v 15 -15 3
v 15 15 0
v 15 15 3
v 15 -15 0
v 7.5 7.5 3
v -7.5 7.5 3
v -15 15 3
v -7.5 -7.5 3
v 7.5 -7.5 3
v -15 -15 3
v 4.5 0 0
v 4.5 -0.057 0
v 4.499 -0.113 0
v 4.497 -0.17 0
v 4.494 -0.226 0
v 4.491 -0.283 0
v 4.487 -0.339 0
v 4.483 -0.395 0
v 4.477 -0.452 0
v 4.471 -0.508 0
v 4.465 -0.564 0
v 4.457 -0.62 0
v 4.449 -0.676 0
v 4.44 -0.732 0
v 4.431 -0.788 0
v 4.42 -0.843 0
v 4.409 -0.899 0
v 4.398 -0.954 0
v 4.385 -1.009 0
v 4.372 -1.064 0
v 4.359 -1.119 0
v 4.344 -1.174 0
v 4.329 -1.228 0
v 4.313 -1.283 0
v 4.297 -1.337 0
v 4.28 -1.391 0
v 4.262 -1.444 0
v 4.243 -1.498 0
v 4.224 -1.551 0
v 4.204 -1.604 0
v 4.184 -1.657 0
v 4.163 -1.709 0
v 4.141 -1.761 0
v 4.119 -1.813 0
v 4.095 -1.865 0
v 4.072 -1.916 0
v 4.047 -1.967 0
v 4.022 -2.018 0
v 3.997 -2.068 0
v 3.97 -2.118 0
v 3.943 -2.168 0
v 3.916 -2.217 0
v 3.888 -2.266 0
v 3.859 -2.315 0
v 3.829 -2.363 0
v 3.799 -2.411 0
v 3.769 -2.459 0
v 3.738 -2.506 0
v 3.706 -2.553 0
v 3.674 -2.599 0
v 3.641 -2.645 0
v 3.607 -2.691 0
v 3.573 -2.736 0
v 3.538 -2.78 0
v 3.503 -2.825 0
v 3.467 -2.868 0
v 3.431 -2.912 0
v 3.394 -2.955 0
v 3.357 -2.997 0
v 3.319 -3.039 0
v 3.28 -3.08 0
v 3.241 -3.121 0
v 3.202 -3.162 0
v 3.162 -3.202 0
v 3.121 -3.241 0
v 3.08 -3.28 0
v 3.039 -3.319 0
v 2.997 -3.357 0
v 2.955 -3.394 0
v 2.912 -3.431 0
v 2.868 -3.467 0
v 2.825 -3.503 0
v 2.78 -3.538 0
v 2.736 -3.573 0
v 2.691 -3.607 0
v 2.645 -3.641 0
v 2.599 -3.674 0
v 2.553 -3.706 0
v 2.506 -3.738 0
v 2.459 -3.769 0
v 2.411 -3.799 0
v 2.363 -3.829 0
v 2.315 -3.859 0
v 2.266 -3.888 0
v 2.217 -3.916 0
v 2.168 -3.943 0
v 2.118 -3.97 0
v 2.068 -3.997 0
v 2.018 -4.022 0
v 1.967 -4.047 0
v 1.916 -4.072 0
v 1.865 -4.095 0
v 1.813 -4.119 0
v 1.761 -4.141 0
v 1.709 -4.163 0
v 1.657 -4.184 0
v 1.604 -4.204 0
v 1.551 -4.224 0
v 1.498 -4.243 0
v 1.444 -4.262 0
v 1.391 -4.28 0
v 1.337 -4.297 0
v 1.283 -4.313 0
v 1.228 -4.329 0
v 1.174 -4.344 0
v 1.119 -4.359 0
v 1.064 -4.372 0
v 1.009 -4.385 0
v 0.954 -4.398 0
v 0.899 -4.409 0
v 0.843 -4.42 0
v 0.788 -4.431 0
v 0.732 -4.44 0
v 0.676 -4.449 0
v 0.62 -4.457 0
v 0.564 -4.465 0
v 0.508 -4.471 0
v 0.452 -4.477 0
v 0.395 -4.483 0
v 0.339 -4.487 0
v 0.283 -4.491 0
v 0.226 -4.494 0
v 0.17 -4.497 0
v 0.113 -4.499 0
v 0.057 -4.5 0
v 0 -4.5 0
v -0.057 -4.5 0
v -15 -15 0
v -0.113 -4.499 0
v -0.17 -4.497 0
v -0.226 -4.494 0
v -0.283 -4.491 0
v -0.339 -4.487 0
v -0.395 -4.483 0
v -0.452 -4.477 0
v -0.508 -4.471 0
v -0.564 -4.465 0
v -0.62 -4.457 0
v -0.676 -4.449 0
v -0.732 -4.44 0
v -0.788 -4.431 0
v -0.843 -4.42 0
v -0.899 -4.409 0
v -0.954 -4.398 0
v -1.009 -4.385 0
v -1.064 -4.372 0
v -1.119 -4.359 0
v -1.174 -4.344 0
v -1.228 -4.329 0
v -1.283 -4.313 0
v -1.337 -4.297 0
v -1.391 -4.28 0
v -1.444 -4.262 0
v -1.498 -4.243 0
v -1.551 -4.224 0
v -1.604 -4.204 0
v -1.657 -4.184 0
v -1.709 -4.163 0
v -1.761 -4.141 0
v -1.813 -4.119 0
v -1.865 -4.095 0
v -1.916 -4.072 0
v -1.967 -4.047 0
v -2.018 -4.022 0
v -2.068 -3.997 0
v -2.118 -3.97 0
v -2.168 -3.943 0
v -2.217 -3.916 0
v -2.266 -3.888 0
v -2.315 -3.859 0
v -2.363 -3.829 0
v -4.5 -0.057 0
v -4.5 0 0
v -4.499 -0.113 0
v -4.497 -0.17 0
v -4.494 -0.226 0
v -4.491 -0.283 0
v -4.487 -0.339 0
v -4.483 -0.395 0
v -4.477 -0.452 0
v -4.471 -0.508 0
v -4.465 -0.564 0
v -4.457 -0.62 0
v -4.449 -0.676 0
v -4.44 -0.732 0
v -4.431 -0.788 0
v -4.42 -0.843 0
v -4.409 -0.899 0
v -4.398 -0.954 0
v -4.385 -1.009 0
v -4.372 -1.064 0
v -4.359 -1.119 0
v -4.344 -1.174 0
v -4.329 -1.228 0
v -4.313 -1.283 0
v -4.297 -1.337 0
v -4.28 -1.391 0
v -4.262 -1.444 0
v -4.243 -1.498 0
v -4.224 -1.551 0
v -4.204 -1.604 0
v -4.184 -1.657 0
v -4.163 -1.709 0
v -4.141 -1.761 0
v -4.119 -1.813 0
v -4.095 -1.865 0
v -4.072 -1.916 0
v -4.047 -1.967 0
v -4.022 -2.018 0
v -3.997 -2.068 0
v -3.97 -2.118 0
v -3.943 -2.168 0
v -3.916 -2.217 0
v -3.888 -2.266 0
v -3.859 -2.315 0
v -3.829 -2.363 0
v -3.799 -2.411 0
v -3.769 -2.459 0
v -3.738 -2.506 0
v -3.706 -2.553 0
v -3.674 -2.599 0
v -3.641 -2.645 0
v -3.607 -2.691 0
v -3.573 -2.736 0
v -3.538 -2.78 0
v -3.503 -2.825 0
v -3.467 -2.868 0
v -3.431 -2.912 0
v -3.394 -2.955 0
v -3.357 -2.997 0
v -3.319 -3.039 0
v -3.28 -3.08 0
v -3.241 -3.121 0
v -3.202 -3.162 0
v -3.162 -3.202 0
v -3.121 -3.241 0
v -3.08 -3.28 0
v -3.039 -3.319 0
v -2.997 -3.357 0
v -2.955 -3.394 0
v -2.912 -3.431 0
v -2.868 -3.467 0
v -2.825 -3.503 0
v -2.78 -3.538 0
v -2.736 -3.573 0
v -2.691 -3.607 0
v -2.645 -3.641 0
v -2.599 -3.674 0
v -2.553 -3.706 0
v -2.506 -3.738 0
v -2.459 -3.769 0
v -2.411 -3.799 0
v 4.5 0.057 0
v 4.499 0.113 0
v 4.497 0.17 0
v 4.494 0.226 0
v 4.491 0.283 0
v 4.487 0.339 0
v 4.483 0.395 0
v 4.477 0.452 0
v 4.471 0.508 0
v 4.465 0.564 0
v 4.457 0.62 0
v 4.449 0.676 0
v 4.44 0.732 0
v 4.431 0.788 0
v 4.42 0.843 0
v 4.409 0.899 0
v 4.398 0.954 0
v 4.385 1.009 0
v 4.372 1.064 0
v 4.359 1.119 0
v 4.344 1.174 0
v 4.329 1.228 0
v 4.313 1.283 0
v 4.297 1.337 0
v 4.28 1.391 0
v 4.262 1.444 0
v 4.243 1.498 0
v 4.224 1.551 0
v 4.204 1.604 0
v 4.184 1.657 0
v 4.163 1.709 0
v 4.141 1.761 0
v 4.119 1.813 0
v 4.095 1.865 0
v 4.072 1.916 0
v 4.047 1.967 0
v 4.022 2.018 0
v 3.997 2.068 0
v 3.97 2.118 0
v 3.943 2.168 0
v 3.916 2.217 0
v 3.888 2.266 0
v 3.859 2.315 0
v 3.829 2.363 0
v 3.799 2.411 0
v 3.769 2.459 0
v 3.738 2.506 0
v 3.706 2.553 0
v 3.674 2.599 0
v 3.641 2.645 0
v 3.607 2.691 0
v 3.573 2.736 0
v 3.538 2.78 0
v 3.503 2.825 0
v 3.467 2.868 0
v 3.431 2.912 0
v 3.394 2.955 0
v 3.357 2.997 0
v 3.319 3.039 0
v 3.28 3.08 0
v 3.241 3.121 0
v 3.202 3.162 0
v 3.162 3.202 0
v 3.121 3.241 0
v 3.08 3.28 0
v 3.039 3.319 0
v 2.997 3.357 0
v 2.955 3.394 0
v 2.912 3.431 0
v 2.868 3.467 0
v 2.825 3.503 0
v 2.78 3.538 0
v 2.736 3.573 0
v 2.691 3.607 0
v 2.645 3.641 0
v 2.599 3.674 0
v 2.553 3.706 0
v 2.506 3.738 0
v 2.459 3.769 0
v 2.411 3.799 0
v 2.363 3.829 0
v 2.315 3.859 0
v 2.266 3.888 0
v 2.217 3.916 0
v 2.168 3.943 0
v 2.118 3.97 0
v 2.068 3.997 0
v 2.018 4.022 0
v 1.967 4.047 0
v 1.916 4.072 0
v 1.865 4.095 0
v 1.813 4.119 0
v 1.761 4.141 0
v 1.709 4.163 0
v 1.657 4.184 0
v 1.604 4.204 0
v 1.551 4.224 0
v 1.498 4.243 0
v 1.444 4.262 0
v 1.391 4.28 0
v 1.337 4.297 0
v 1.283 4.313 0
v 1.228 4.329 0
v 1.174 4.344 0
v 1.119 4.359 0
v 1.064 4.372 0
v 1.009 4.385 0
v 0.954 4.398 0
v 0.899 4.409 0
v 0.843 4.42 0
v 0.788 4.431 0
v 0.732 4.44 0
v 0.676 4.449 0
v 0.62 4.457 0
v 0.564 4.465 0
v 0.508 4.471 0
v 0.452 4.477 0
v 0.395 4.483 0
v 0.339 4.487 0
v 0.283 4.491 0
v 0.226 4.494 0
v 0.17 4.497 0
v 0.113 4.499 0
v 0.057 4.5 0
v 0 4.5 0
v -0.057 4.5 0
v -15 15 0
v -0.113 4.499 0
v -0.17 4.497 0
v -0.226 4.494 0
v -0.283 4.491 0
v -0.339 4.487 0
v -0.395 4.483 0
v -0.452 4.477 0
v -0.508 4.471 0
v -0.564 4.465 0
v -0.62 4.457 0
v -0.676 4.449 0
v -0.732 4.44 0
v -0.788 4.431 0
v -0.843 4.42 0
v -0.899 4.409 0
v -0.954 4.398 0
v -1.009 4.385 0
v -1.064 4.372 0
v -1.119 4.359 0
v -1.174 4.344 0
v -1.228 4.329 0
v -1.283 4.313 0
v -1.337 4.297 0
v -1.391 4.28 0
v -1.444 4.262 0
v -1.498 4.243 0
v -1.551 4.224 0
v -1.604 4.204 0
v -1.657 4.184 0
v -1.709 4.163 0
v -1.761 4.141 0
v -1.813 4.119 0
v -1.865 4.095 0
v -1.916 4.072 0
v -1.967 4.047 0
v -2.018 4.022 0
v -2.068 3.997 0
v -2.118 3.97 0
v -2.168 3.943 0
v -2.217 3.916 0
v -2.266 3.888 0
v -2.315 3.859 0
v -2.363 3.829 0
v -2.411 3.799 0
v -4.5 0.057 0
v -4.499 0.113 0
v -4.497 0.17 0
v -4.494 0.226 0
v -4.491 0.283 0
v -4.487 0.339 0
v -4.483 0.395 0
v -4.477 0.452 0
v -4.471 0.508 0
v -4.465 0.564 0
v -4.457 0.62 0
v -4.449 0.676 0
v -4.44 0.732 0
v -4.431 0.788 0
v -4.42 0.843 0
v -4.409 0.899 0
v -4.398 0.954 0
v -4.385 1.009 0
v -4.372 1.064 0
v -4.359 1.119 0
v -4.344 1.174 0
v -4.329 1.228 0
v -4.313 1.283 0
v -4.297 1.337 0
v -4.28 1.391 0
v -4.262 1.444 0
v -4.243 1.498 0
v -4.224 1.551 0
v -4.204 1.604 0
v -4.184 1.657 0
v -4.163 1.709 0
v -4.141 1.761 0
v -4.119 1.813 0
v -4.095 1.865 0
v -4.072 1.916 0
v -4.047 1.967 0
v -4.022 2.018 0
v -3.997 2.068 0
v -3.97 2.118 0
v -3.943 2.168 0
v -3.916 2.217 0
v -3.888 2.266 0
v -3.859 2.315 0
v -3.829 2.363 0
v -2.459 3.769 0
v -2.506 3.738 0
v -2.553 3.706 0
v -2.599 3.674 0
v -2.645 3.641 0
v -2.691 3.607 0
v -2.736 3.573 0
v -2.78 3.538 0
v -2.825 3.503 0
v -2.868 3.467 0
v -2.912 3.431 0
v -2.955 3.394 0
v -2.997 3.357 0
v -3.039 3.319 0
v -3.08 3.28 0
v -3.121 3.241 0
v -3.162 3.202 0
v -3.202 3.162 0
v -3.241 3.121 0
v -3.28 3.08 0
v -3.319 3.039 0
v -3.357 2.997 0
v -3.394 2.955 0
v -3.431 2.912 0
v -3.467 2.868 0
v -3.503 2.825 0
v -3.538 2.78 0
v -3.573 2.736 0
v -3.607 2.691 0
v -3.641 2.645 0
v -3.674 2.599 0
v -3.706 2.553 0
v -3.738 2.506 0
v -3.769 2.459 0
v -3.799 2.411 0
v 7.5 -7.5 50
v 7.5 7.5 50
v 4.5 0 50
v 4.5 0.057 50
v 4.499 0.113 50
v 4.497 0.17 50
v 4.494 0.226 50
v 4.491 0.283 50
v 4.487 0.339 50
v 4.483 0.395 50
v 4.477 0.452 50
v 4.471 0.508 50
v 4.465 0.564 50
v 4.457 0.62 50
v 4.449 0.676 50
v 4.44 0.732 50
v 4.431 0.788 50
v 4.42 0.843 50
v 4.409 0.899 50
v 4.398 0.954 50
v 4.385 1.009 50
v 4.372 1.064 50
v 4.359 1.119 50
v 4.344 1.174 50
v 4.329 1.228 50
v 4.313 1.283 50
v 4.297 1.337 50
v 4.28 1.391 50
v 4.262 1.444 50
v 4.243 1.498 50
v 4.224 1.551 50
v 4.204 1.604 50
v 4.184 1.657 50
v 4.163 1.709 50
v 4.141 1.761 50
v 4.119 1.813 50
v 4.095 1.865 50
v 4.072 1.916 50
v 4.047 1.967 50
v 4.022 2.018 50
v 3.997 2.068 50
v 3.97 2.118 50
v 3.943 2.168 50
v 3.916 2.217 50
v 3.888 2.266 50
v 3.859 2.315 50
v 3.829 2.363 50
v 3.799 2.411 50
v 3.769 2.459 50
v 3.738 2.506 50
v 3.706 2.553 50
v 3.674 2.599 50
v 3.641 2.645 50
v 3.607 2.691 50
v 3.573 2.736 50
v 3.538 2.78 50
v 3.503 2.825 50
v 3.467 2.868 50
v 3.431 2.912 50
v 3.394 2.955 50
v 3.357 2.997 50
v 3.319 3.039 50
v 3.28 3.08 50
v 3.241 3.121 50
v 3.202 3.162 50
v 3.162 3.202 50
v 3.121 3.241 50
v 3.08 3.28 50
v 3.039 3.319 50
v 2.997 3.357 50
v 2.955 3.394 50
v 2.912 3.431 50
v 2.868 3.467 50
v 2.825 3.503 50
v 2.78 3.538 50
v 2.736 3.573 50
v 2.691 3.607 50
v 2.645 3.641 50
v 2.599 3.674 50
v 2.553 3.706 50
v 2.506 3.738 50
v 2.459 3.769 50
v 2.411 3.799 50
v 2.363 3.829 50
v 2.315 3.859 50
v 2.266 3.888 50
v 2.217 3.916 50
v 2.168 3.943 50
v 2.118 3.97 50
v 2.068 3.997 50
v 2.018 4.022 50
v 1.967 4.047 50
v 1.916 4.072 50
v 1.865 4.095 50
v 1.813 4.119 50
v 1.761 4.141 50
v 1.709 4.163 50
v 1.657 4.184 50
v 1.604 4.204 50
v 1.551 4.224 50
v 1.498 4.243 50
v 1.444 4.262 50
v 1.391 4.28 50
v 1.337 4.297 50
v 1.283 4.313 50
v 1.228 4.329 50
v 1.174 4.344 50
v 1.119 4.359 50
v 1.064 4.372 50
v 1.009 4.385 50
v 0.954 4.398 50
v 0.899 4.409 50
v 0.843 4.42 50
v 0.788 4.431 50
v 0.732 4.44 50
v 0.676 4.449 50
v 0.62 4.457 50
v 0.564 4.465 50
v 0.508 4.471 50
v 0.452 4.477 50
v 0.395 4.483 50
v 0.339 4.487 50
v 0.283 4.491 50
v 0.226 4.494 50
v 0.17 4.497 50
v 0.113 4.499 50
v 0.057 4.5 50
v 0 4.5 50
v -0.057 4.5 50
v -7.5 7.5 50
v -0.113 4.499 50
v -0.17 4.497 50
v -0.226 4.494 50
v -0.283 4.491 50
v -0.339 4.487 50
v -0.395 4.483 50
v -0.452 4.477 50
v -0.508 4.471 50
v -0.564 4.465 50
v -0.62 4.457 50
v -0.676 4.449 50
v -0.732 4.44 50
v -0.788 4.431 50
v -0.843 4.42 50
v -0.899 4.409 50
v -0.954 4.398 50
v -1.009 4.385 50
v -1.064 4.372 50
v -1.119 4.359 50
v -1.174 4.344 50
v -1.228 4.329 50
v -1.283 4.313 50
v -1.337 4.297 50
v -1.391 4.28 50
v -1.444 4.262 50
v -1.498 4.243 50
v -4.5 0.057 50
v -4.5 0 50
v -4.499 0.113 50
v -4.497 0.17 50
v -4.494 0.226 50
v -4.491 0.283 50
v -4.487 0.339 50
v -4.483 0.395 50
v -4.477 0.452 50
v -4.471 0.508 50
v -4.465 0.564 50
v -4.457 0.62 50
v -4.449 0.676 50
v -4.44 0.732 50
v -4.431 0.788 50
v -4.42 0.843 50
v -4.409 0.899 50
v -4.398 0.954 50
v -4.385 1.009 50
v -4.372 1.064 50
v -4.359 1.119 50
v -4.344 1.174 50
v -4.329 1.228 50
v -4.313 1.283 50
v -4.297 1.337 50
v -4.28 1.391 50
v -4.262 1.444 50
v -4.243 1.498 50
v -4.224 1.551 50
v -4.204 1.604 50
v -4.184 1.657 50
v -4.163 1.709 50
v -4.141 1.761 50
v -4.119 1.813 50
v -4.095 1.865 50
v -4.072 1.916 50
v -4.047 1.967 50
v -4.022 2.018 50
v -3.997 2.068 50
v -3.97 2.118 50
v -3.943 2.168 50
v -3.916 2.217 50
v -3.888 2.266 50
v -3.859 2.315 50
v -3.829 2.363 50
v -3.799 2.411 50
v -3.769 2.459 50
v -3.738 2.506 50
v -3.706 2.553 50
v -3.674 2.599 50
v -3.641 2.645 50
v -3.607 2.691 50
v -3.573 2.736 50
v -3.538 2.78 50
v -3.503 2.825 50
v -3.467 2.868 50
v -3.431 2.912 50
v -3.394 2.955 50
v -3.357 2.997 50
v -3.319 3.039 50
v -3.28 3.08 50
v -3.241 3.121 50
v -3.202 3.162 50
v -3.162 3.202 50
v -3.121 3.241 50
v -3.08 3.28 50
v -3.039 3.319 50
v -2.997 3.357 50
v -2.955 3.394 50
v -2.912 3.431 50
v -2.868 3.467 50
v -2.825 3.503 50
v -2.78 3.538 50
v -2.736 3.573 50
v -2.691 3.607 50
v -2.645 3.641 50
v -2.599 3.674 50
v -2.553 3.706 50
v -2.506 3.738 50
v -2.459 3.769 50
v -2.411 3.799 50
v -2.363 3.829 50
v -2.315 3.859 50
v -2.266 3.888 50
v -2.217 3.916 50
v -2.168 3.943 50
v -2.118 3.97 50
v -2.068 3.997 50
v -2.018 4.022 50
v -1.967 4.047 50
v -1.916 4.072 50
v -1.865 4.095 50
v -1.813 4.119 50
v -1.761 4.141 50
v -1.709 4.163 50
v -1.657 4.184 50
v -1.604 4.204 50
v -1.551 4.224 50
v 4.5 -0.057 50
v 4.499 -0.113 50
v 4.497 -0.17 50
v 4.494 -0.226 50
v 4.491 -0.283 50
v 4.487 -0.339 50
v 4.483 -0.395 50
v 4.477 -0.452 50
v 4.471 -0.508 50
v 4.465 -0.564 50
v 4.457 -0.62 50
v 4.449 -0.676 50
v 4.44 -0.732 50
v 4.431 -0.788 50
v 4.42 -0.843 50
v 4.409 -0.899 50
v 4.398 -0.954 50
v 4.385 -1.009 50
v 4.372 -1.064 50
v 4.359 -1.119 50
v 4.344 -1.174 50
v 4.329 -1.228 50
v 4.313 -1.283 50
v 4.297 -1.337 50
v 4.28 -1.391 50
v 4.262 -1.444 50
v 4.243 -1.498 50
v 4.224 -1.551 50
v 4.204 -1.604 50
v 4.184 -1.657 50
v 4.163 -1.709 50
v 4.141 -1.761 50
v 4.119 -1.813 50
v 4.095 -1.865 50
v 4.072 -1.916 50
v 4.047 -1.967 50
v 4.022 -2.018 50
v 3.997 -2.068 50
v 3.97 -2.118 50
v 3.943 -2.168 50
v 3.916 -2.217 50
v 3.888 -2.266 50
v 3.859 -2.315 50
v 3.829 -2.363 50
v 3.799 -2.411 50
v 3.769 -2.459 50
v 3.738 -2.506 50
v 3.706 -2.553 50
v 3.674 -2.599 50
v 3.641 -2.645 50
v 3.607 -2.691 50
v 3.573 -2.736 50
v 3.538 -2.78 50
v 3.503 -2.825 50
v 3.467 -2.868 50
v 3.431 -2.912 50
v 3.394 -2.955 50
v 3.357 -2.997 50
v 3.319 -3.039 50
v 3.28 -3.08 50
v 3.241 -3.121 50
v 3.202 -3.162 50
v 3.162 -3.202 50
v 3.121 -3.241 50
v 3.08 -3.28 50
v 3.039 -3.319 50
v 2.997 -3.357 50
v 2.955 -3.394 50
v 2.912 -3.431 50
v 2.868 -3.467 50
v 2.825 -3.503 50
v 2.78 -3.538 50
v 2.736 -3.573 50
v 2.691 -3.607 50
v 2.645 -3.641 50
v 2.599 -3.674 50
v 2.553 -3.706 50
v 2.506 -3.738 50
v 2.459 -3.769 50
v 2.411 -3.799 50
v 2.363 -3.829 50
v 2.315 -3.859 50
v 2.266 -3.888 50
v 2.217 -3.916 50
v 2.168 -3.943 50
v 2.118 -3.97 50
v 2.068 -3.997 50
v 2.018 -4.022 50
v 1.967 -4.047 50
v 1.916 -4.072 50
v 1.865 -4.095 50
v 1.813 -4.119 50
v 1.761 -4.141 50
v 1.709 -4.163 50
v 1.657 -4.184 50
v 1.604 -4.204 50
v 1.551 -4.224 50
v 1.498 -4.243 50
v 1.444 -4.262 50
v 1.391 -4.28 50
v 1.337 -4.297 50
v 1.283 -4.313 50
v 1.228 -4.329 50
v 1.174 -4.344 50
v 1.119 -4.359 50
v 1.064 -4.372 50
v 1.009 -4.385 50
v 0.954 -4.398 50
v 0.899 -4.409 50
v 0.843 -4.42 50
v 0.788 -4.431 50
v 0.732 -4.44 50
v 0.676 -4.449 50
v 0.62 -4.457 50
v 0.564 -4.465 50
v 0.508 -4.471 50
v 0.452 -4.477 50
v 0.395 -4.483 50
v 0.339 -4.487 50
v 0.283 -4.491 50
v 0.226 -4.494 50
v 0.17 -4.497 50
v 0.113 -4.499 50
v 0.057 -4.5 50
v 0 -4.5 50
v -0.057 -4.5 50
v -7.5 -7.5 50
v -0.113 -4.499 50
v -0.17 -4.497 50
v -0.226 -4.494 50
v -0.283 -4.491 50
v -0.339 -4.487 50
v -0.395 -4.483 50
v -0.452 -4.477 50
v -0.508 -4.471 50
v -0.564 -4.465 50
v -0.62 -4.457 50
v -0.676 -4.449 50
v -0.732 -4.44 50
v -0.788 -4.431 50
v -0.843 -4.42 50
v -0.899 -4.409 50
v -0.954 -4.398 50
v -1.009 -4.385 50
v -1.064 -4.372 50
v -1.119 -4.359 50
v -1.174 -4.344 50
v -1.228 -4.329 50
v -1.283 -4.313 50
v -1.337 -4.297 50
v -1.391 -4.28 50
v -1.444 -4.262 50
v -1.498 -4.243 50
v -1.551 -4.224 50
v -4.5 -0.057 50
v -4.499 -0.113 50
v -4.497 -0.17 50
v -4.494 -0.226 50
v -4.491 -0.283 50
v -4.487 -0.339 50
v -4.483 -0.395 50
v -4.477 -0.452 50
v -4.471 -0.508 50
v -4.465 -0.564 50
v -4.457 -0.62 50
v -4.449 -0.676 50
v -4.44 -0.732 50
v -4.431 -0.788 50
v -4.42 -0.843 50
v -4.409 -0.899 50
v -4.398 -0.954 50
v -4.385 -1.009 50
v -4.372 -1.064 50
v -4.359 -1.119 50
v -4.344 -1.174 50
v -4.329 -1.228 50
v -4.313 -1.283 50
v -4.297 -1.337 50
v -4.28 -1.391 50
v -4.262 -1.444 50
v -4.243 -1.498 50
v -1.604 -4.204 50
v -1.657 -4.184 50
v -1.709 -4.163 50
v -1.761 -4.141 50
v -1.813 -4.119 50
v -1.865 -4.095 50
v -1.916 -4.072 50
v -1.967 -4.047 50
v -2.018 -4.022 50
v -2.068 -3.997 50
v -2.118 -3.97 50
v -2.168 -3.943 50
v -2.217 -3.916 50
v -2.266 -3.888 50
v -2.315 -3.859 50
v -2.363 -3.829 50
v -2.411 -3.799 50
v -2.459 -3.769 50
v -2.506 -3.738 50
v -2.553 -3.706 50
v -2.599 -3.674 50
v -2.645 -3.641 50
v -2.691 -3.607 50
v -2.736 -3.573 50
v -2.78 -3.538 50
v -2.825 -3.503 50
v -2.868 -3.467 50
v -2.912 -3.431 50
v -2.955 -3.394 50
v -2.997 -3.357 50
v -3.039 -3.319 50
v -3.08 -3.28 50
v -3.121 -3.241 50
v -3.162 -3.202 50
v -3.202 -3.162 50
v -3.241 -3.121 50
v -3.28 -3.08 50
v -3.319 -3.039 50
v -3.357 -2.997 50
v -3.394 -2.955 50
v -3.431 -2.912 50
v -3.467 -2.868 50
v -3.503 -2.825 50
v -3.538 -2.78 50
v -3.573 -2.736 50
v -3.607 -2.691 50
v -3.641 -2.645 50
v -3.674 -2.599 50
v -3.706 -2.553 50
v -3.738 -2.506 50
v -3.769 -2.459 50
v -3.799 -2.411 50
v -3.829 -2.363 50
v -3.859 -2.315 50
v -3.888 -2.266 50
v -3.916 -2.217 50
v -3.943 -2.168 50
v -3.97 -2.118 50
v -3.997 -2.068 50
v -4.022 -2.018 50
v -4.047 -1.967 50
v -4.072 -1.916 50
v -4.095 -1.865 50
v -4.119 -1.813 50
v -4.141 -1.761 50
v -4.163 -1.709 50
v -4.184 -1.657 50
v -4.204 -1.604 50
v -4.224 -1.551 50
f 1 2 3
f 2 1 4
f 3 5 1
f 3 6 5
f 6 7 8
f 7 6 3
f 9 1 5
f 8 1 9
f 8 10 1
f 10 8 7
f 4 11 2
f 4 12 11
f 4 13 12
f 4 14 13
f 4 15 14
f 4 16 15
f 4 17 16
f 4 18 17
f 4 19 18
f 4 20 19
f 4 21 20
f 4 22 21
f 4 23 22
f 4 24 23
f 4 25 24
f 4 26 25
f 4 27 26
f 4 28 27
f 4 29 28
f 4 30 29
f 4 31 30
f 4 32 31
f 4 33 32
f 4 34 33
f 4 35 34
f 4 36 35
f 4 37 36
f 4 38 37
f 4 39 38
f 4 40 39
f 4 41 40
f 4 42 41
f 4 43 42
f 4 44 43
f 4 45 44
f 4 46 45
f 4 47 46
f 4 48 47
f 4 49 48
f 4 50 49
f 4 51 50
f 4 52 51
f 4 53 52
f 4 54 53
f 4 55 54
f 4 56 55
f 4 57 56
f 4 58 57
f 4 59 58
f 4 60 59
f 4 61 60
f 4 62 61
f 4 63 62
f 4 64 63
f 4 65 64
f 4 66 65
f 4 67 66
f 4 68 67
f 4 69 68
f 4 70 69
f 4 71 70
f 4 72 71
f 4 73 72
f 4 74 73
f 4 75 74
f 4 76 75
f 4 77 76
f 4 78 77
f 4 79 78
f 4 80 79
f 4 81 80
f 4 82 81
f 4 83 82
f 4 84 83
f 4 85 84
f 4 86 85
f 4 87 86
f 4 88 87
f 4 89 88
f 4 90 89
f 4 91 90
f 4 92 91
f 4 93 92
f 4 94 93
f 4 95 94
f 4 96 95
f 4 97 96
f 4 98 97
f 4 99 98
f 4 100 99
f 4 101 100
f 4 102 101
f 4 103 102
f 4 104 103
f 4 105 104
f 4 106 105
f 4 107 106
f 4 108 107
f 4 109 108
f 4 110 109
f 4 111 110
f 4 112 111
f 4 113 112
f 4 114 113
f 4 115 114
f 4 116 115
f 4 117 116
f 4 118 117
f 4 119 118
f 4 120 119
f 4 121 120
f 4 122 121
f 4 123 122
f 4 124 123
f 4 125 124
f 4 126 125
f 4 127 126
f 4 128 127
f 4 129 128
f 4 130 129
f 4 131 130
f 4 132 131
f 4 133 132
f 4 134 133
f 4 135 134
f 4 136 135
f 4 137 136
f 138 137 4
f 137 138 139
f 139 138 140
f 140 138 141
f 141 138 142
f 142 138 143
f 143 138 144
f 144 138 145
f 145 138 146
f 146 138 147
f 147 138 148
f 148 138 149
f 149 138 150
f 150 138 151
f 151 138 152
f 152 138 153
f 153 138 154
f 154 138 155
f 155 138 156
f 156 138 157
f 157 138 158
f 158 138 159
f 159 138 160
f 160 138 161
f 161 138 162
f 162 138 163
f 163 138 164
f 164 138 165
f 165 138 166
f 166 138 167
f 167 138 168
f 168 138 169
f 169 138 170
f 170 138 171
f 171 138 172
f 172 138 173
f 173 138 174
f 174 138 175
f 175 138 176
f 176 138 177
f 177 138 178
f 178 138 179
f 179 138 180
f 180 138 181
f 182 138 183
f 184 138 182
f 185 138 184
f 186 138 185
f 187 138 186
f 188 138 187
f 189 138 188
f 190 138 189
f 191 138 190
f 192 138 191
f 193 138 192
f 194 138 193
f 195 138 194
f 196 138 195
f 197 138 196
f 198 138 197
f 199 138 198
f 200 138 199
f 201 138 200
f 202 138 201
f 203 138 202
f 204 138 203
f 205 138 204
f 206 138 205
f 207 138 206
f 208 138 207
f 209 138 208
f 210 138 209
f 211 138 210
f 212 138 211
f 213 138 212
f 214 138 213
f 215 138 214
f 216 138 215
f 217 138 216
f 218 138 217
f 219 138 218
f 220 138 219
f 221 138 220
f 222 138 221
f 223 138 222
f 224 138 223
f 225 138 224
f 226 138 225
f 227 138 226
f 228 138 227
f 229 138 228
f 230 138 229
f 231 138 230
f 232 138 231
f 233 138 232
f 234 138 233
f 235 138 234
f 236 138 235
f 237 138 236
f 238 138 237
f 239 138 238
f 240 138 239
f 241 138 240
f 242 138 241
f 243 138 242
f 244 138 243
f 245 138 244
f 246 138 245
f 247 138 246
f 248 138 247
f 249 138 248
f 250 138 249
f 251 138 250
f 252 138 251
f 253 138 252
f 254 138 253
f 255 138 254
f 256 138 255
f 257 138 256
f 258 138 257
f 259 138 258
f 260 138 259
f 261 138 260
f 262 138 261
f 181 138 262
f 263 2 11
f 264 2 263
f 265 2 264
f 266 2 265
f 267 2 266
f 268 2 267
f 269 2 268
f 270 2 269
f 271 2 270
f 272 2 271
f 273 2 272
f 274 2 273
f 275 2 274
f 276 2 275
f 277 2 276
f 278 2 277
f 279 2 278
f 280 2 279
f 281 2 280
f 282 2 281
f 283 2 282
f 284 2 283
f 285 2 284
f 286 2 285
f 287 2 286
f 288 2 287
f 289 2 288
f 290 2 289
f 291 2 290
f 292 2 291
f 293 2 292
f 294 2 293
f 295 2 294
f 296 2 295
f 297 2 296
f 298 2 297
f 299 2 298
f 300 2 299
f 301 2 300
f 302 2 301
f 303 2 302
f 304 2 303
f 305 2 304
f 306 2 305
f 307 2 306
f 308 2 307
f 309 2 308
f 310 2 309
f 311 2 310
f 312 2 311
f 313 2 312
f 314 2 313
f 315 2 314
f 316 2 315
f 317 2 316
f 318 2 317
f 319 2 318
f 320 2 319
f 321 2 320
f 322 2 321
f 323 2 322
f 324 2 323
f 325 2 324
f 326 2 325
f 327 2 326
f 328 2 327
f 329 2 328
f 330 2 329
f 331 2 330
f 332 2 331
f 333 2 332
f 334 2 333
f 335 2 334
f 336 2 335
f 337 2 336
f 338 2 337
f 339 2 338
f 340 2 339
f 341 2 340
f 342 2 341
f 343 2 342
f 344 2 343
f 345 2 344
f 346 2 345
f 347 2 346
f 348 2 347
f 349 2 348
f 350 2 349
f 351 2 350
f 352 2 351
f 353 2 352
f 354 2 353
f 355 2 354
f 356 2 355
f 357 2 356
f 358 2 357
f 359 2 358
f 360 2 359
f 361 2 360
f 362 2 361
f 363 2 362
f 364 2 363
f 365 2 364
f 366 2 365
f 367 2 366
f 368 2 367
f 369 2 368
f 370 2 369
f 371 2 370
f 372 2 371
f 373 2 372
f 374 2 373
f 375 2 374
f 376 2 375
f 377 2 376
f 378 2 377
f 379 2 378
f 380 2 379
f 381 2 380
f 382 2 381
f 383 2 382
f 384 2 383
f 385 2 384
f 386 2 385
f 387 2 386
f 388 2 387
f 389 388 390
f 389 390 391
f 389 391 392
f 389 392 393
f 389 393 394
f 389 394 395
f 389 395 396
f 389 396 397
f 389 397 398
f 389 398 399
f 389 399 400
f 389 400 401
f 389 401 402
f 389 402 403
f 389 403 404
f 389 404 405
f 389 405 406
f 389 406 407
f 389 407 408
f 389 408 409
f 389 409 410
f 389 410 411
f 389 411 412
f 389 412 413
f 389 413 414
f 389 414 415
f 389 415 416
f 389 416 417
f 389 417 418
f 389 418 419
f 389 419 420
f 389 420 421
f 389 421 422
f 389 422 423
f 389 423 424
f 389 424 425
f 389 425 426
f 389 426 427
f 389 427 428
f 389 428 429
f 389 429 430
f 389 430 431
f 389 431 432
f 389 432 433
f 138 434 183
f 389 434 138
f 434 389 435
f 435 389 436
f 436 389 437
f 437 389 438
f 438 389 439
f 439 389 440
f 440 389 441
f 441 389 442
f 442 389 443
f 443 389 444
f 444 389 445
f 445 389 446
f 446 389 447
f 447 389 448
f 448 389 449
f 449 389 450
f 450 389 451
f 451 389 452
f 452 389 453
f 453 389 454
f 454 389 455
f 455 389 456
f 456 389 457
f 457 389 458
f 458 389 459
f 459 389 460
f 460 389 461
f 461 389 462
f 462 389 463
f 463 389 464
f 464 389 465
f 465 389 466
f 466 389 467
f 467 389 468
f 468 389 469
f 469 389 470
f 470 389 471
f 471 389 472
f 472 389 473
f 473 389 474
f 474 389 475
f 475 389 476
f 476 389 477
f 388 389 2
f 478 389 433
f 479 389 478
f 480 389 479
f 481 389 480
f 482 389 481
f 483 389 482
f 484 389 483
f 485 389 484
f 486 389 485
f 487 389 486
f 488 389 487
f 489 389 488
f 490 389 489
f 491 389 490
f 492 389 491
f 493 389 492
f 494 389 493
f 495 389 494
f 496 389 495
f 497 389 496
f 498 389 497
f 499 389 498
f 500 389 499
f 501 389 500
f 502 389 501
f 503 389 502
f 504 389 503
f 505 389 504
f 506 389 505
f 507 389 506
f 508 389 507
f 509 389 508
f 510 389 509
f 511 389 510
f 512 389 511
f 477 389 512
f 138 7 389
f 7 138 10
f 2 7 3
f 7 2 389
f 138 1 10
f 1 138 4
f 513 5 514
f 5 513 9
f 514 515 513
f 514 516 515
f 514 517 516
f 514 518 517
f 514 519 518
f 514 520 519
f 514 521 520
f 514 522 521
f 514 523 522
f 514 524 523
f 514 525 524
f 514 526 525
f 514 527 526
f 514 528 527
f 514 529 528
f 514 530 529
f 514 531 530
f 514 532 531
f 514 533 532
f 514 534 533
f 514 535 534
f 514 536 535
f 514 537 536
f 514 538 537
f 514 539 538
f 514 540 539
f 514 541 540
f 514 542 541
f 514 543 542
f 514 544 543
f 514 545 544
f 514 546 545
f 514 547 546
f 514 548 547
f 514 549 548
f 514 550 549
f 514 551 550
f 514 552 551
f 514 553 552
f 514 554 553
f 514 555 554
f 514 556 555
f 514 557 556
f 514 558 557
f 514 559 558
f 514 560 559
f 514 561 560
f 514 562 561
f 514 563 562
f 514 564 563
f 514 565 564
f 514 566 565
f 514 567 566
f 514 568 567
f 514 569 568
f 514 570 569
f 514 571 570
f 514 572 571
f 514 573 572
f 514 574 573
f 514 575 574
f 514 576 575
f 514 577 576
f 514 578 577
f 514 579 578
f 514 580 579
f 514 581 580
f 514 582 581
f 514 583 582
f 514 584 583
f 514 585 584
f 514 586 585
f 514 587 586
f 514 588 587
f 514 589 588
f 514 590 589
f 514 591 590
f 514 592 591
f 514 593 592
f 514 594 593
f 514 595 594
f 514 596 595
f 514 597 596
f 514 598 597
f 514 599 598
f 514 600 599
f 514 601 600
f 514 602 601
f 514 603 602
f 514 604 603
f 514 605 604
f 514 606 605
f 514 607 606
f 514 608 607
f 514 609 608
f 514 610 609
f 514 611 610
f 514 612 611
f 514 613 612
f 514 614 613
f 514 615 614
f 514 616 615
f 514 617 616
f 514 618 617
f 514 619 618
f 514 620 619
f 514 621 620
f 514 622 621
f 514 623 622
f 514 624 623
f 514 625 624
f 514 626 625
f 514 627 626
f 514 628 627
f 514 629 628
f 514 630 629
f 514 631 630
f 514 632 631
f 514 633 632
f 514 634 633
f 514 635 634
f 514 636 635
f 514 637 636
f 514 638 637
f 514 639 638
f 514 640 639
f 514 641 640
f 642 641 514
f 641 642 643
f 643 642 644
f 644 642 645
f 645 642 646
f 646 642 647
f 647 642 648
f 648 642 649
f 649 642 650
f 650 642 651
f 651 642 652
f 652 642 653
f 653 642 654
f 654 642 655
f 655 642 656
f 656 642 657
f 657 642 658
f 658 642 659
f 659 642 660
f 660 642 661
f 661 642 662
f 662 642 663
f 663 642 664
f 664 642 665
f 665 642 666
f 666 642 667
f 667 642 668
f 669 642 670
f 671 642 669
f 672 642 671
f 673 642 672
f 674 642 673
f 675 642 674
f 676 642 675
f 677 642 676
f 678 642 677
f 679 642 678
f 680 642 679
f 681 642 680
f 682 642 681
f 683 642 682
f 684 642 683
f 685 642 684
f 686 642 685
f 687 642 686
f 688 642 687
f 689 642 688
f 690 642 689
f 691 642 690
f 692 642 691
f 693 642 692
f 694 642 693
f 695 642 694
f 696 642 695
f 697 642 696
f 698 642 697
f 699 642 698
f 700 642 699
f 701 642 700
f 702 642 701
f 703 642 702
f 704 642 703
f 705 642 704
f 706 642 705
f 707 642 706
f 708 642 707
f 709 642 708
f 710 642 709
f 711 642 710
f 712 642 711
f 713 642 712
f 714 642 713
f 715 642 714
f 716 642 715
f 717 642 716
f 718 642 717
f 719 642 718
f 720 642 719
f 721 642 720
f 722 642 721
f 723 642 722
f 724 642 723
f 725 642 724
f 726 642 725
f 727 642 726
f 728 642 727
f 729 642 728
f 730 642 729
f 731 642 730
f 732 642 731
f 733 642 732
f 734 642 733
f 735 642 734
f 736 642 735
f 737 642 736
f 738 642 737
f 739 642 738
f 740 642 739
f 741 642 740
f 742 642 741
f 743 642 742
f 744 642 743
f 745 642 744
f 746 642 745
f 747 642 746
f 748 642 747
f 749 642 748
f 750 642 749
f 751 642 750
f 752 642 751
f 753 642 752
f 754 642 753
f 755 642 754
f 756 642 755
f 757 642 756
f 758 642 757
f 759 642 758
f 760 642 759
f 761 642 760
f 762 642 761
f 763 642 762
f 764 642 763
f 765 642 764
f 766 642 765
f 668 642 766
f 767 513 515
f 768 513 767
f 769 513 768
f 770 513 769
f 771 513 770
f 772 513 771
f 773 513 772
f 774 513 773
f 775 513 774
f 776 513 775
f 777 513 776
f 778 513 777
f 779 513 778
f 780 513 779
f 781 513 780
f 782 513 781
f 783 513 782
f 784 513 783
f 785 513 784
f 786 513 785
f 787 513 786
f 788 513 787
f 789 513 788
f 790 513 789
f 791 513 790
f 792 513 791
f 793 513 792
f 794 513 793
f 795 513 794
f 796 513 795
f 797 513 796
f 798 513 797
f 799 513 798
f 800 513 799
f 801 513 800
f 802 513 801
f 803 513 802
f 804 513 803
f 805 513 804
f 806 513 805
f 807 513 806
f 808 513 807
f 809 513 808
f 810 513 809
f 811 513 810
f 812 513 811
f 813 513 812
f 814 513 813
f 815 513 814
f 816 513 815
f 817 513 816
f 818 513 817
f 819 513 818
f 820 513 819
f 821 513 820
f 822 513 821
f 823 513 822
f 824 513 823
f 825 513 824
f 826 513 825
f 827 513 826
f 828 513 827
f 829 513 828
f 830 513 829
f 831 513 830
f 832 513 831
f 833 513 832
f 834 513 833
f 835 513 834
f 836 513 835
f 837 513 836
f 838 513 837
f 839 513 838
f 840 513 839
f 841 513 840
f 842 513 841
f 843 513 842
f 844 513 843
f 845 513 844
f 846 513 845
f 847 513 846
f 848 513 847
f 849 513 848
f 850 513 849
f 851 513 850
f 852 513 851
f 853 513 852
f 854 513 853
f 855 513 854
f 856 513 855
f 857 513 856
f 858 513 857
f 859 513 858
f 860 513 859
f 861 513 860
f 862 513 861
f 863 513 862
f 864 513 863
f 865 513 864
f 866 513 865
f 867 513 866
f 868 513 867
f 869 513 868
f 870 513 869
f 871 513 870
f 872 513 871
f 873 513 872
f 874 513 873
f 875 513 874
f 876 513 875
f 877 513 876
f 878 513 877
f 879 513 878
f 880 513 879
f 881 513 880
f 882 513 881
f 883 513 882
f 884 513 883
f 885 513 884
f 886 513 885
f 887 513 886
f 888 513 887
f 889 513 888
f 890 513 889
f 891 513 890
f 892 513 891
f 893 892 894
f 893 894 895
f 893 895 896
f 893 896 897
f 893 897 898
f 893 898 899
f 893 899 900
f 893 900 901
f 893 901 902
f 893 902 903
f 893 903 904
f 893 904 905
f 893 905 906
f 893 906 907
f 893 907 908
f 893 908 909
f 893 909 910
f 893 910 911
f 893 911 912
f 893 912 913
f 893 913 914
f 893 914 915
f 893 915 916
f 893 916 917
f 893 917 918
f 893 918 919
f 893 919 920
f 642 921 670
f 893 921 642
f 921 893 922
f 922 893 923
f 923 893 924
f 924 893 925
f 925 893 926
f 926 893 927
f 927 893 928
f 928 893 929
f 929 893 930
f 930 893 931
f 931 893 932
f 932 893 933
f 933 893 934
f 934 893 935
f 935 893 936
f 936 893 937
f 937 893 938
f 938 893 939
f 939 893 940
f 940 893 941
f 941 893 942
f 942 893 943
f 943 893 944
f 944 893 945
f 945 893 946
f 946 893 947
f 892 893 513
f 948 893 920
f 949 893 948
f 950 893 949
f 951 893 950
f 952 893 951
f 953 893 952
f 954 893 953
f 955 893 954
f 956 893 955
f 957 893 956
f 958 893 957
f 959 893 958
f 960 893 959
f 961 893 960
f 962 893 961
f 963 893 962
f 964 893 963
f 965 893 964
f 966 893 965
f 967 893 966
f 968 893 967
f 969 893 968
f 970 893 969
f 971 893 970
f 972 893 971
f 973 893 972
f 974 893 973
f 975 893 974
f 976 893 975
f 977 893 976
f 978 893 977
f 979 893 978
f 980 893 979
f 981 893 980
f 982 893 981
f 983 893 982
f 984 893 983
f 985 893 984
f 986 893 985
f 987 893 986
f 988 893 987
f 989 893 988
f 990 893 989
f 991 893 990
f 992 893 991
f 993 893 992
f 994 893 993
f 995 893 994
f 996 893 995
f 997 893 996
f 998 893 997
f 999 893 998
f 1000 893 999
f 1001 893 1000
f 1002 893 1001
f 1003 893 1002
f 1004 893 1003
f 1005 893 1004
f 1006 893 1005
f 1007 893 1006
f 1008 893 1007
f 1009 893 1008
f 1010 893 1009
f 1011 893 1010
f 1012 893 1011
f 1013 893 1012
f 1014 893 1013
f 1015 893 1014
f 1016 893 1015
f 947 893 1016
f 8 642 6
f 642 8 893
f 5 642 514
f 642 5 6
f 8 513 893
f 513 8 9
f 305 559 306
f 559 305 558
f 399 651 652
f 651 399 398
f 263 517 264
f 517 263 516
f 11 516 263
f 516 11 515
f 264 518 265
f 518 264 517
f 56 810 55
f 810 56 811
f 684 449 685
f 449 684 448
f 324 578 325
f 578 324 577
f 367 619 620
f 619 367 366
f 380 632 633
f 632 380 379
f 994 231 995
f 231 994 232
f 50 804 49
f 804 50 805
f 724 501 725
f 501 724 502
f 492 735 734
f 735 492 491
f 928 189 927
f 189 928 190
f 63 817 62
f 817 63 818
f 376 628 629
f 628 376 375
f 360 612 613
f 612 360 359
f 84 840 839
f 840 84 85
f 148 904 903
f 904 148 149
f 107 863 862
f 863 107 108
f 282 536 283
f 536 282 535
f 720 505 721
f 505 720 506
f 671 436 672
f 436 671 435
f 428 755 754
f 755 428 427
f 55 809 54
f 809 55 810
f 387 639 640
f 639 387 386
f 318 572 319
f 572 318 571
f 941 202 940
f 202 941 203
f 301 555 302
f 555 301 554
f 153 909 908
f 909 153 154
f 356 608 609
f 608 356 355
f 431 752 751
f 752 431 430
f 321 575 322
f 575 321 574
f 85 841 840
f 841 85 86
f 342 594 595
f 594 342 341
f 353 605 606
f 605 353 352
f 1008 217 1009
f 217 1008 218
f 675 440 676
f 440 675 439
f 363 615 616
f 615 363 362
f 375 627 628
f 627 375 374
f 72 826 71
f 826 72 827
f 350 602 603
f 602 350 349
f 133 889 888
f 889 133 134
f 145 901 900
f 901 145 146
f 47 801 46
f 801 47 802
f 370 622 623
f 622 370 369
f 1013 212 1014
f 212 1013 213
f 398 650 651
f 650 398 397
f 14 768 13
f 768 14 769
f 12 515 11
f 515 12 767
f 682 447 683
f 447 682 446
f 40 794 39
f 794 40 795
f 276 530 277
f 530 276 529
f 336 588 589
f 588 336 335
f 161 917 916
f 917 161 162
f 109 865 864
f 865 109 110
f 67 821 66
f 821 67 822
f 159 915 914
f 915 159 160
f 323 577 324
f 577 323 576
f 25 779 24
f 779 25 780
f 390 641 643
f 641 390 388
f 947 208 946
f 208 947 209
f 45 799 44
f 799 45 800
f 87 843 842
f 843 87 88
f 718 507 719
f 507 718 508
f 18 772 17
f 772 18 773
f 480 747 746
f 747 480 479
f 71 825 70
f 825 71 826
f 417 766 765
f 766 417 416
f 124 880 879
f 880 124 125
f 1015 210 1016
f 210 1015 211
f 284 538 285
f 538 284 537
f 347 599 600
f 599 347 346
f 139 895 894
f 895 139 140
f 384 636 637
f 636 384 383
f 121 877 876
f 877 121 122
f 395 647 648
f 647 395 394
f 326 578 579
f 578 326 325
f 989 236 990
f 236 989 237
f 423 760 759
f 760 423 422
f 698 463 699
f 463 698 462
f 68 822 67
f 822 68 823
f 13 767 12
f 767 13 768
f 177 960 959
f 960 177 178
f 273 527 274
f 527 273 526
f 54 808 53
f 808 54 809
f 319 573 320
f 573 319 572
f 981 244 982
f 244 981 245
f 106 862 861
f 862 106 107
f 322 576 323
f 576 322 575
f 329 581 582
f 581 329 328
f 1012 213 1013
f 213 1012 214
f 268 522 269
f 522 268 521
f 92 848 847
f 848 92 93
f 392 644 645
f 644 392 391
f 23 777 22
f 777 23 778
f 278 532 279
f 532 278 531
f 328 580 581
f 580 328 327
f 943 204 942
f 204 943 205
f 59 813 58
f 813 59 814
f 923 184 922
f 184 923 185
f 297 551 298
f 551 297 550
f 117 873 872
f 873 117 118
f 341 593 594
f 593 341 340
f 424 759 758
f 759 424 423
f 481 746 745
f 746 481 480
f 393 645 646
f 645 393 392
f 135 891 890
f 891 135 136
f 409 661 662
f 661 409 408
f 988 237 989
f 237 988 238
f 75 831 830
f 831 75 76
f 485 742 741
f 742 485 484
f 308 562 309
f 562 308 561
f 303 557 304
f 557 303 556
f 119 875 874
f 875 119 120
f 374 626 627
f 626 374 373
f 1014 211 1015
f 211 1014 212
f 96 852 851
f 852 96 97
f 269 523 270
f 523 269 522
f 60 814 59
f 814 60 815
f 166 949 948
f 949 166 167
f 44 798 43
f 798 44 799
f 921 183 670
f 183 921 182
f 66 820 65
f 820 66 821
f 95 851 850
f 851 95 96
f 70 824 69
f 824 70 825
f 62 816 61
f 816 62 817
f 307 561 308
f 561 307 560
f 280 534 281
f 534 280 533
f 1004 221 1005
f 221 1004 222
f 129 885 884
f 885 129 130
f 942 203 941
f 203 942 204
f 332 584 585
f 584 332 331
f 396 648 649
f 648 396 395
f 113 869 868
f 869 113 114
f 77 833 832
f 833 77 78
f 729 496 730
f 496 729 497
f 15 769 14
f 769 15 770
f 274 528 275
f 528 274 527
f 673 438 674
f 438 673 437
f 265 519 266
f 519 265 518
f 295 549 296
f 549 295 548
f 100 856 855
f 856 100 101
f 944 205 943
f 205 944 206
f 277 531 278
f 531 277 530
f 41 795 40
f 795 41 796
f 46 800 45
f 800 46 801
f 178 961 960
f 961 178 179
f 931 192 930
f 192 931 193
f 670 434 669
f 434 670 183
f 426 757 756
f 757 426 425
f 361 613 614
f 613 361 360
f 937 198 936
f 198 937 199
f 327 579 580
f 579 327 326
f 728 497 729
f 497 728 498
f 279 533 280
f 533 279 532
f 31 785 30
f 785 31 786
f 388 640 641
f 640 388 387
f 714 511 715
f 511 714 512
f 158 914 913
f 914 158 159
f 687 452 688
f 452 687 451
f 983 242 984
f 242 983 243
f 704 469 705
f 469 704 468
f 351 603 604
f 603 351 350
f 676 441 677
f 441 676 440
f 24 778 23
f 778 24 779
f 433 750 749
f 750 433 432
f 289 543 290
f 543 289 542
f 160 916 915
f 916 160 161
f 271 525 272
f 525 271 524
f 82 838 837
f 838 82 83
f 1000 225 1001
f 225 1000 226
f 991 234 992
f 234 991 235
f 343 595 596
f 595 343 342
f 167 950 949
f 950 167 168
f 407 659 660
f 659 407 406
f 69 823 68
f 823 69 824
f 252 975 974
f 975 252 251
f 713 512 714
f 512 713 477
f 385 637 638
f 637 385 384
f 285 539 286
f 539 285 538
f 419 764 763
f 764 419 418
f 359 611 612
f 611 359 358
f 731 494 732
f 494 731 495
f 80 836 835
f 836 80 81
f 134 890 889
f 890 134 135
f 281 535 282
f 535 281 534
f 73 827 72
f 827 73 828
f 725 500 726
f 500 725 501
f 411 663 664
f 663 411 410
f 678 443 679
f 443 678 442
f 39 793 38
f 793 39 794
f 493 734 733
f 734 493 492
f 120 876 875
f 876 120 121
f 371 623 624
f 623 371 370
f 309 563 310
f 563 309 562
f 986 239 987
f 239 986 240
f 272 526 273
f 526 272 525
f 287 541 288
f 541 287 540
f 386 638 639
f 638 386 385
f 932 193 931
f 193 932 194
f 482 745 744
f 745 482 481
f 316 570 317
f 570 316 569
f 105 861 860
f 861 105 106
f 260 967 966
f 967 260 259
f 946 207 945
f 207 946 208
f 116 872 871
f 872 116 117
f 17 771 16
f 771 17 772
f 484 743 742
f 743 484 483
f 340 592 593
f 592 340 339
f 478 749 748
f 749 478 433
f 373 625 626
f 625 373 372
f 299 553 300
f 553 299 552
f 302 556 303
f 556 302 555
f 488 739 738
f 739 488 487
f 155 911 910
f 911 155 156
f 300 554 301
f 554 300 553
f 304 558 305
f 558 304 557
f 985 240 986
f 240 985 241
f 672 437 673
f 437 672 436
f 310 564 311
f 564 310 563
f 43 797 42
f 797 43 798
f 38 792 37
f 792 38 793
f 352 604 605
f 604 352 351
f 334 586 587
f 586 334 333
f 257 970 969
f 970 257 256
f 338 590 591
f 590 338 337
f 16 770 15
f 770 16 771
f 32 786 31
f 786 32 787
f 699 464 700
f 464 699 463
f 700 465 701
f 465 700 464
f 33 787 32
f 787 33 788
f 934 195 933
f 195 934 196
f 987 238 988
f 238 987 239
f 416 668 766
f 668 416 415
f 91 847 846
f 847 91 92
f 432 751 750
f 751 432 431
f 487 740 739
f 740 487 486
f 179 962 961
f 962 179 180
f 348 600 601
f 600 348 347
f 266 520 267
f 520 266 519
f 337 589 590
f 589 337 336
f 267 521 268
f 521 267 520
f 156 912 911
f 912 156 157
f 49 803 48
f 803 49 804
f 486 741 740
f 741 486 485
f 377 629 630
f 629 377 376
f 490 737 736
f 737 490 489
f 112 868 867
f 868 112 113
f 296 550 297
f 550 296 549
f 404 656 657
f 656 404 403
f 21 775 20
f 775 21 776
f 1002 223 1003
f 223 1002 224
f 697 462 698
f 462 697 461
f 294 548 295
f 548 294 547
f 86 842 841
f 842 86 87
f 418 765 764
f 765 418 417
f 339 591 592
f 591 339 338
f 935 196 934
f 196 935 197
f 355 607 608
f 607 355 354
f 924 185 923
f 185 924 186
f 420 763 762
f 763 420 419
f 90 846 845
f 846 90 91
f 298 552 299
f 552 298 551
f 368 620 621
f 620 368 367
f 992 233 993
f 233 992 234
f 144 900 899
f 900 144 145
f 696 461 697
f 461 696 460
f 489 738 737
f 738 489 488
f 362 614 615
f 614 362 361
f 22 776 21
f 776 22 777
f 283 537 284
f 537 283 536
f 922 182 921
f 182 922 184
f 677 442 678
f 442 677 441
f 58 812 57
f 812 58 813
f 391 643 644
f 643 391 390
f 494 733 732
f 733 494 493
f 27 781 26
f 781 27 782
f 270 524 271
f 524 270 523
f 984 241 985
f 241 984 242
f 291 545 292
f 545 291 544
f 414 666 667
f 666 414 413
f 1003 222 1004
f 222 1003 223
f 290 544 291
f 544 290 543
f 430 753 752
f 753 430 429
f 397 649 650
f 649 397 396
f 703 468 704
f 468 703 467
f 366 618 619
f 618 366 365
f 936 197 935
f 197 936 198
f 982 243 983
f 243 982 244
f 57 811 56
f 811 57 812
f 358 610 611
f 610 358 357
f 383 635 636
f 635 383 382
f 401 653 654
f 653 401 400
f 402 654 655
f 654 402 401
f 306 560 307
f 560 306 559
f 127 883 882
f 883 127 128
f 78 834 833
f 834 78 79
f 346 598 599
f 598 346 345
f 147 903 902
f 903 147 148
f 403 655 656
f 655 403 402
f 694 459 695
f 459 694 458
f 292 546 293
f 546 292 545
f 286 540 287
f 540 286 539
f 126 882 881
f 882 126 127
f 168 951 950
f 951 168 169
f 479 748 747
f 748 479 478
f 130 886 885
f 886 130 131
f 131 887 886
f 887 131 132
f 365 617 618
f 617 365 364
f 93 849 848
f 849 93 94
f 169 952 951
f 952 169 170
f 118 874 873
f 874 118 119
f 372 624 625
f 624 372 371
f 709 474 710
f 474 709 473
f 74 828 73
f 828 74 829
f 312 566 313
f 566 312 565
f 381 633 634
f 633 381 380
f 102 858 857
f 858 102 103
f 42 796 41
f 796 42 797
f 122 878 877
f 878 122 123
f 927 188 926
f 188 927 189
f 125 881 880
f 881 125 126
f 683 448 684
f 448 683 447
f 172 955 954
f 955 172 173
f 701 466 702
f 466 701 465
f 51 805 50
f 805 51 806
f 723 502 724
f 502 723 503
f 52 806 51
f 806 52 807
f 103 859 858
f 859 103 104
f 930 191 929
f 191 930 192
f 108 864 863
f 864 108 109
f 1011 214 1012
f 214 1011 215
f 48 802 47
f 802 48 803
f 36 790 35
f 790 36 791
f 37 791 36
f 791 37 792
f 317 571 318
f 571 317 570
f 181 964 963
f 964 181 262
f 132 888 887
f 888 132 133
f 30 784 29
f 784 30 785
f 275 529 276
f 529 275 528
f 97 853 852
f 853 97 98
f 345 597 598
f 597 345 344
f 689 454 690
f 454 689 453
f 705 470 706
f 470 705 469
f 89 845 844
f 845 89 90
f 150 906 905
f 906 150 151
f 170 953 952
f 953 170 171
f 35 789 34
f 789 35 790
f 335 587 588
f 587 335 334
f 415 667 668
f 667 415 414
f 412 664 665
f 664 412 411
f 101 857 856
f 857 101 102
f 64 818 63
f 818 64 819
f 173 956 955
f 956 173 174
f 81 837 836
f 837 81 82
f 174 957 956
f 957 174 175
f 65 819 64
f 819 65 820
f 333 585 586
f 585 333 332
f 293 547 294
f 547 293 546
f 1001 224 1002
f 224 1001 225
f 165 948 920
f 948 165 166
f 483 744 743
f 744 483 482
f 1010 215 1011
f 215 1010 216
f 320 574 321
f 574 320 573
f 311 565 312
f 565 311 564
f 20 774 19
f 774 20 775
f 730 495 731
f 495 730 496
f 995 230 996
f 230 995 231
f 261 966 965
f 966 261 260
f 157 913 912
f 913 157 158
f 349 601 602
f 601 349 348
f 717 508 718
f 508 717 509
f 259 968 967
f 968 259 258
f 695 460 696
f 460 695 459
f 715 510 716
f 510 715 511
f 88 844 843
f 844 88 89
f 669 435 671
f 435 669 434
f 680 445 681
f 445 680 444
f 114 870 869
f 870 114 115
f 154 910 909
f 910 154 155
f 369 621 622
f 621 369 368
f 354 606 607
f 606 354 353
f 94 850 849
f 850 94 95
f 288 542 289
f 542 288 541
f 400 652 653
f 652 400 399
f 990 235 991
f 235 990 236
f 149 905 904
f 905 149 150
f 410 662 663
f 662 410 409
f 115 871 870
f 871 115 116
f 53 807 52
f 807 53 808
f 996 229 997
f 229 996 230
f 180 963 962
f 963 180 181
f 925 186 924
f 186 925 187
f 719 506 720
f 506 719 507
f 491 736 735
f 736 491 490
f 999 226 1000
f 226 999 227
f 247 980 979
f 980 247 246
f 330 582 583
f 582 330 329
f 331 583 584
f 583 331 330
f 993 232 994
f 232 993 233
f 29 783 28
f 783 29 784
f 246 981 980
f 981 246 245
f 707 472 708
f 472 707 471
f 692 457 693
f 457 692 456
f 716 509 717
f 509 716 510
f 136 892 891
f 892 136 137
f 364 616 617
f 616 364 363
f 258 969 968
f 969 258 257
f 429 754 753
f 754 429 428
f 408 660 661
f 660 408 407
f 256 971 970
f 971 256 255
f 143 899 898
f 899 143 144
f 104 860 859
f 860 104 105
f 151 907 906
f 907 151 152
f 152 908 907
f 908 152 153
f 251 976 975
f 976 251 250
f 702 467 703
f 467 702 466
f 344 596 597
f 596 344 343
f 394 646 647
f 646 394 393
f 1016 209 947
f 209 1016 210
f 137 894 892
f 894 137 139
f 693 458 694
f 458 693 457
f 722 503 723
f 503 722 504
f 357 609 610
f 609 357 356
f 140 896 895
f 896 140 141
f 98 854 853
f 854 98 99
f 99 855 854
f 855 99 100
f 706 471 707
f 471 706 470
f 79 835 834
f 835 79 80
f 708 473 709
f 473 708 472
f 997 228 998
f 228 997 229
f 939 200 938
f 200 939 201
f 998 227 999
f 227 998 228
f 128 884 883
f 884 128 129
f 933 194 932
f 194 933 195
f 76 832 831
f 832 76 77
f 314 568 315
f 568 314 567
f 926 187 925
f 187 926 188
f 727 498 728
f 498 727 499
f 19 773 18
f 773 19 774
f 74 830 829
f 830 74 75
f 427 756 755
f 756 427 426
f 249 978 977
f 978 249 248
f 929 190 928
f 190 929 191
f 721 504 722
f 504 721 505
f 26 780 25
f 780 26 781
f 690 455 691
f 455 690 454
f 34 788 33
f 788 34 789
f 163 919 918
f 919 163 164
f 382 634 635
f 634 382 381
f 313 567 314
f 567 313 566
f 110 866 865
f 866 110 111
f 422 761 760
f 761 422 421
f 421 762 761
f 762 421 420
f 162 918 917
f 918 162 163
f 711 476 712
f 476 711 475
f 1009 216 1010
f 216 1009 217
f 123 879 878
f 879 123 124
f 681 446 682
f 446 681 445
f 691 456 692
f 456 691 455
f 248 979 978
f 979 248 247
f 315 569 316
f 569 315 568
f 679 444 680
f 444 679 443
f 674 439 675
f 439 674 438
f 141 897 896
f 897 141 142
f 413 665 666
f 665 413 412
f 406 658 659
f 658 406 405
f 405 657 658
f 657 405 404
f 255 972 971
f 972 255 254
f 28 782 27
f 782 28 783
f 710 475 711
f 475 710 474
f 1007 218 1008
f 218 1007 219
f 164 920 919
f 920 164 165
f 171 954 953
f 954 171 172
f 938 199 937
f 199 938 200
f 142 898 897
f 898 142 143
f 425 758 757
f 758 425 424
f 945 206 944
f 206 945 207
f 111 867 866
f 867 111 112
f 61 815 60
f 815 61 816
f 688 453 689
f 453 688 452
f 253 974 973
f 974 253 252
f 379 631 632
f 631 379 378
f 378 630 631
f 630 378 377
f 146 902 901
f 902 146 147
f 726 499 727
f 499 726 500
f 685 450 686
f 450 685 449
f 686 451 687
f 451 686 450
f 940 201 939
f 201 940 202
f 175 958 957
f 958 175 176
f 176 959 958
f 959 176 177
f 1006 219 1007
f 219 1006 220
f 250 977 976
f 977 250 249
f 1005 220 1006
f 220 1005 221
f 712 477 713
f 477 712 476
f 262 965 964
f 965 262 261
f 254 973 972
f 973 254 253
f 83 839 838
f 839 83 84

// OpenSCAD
screw_height = 50;
screw_diam = 9;
leg_width = 15;
platform_width = 30;
platform_height = 3;


difference() {
    union() {
        translate([0,0,platform_height/2])
            cube([platform_width,platform_width,platform_height],center=true);
        translate([0,0,screw_height/2])
            cube([leg_width,leg_width,screw_height],center=true);
    }
    cylinder(d=screw_diam,h=screw_height,$fn=500);
}
